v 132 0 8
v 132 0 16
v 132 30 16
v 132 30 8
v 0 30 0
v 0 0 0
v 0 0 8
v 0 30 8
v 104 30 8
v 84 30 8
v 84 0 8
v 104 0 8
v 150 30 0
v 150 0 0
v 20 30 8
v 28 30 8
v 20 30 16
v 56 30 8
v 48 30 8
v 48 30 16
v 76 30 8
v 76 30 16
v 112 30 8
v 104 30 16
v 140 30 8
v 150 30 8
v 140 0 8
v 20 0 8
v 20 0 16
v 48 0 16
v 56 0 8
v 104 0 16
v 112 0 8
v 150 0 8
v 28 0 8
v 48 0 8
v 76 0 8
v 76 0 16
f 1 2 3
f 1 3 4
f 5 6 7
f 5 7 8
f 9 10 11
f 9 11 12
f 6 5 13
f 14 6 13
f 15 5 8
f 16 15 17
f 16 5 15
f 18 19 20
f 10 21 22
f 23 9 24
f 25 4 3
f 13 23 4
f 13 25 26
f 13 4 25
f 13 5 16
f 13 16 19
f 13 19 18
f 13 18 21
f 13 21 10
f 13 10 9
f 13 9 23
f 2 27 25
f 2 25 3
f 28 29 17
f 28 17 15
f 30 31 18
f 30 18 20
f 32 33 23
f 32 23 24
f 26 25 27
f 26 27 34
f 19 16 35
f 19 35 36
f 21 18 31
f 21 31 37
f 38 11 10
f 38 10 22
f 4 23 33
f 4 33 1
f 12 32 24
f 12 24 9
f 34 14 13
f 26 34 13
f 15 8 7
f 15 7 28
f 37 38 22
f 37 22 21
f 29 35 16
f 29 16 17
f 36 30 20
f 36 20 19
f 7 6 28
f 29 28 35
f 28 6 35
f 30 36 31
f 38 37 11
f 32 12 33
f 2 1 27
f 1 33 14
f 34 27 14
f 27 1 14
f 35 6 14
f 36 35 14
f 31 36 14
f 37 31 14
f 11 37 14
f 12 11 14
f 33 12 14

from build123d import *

# Parameters (mm, degrees)
F0_W     = 150
F0_H     = 30
F2_DEPTH = 8
F3_DEPTH = 30


with BuildPart() as f2:
    # F0 (on Top) → F2 (new body)
    with BuildSketch(Plane.XY):
        with Locations((75, 15)):
            Rectangle(F0_W, F0_H)
    extrude(amount=F2_DEPTH)

    # F1 (on Front) → F3 (join)
    with BuildSketch(Plane.XZ):
        Polygon((28, 8), (20, 16), (20, 8), align=None)
        Polygon((56, 8), (48, 16), (48, 8), align=None)
        Polygon((84, 8), (76, 16), (76, 8), align=None)
        Polygon((112, 8), (104, 16), (104, 8), align=None)
        Polygon((140, 8), (132, 16), (132, 8), align=None)
    extrude(amount=-F3_DEPTH)


solid = f2.part
